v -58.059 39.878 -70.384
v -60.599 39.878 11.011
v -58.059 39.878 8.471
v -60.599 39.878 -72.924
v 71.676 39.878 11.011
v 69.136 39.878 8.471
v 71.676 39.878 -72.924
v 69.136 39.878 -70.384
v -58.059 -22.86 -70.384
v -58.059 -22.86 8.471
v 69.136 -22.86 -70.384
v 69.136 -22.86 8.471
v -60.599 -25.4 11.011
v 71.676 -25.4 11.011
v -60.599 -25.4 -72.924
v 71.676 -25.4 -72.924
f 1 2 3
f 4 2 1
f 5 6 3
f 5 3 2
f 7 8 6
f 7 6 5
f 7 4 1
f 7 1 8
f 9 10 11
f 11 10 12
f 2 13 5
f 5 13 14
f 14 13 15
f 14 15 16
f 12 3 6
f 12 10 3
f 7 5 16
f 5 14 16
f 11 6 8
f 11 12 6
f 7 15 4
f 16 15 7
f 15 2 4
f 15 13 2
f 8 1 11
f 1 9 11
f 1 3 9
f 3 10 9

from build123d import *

# Parameters (mm, degrees)
F0_W      = 132.275518
F0_H      = 83.935342
F1_DEPTH  = 25.4
F1_FACE_W = 132.275518
F1_FACE_H = 83.935342
F2_DEPTH  = 39.878
F3_T      = -2.54


with BuildPart() as f1:
    # F0 (on Front) → F1 (new body)
    with BuildSketch(Plane.XZ):
        with Locations((5.538398, -30.956518)):
            Rectangle(F0_W, F0_H)
    extrude(amount=F1_DEPTH)

    # F1_face (on face) → F2 (join)
    with BuildSketch(Plane(origin=(5.538398, 0, -30.956518), x_dir=(1, 0, 0), z_dir=(0, 1, 0))):
        Rectangle(F1_FACE_W, F1_FACE_H)
    extrude(amount=F2_DEPTH)

    # F3
    f3_openings = [f1.faces().sort_by_distance(p)[0] for p in [
        (5.538398, 39.878, -30.956518),
    ]]
    offset(amount=F3_T, openings=f3_openings)


solid = f1.part
